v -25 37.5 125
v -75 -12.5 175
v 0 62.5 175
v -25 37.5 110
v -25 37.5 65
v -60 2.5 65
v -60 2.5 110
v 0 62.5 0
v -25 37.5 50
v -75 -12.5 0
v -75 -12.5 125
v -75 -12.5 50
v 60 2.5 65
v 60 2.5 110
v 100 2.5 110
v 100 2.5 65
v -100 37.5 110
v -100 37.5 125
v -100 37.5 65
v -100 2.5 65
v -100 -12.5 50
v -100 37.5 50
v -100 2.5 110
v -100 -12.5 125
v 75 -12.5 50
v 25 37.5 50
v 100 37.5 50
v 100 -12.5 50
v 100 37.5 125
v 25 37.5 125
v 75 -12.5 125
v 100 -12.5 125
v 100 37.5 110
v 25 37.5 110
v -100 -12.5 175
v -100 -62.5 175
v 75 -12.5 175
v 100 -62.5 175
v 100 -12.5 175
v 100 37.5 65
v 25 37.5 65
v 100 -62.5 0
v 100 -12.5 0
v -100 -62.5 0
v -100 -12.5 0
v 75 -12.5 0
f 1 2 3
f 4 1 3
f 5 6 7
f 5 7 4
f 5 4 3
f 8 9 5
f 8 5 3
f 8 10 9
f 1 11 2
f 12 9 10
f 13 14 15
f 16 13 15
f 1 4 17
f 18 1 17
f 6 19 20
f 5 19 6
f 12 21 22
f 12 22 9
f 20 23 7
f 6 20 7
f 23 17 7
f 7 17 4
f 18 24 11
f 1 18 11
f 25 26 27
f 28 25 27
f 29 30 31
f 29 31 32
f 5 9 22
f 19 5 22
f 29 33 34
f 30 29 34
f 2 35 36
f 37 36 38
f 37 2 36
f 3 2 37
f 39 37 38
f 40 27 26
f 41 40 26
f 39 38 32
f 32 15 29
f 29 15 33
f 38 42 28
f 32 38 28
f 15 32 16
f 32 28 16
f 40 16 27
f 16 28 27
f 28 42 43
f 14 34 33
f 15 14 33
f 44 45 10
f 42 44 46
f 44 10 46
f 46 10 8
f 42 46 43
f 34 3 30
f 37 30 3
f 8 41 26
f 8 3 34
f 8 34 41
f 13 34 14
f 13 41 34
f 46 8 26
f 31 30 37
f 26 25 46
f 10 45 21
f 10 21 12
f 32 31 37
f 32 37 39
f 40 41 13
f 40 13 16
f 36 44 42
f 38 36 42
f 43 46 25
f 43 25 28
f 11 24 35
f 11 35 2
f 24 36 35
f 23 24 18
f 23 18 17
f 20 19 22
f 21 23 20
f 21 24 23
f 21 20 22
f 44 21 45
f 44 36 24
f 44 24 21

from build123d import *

# Parameters (mm, degrees)
SKETCH1_W           = 200
SKETCH1_H           = 125
BOSS_EXTRUDE1_DEPTH = 175
CUT_EXTRUDE1_DEPTH  = 212.024287702
CUT_EXTRUDE2_DEPTH  = 212.024287702
BOSS_EXTRUDE2_DEPTH = 125
CUT_EXTRUDE3_DEPTH  = 110
BOSS_EXTRUDE3_DEPTH = 65
CUT_EXTRUDE4_DEPTH  = 50
SKETCH3_W           = 200
SKETCH3_H           = 45
BOSS_EXTRUDE4_DEPTH = 15


with BuildPart() as part:
    # Sketch1 → Boss-Extrude1 (new body)
    with BuildSketch(Plane.XY):
        Rectangle(SKETCH1_W, SKETCH1_H)
    extrude(amount=BOSS_EXTRUDE1_DEPTH)

    # Sketch1<3> → Cut-Extrude1 (cut, through all)
    with BuildSketch(Plane.XY):
        Polygon((-100, 62.5), (-100, 37.5), (-25, 37.5), (0, 62.5), align=None)
        Polygon((0, 62.5), (25, 37.5), (100, 37.5), (100, 62.5), align=None)
    extrude(amount=CUT_EXTRUDE1_DEPTH, mode=Mode.SUBTRACT)

    # Sketch1<4> → Cut-Extrude2 (cut, through all)
    with BuildSketch(Plane.XY):
        Polygon((-100, 37.5), (-100, -12.5), (-75, -12.5), (-25, 37.5), align=None)
        Polygon((25, 37.5), (75, -12.5), (100, -12.5), (100, 37.5), align=None)
    extrude(amount=CUT_EXTRUDE2_DEPTH, mode=Mode.SUBTRACT)

    # Sketch1<5> → Boss-Extrude2 (add)
    with BuildSketch(Plane.XY):
        Polygon((-100, 37.5), (-100, -12.5), (-75, -12.5), (-25, 37.5), align=None)
        Polygon((25, 37.5), (75, -12.5), (100, -12.5), (100, 37.5), align=None)
    extrude(amount=BOSS_EXTRUDE2_DEPTH)

    # Sketch1<6> → Cut-Extrude3 (cut)
    with BuildSketch(Plane.XY):
        Polygon((-100, 37.5), (-100, -12.5), (-75, -12.5), (-25, 37.5), align=None)
        Polygon((25, 37.5), (75, -12.5), (100, -12.5), (100, 37.5), align=None)
    extrude(amount=CUT_EXTRUDE3_DEPTH, mode=Mode.SUBTRACT)

    # Sketch1<9> → Boss-Extrude3 (add)
    with BuildSketch(Plane.XY):
        Polygon((-100, 37.5), (-100, -12.5), (-75, -12.5), (-25, 37.5), align=None)
        Polygon((25, 37.5), (75, -12.5), (100, -12.5), (100, 37.5), align=None)
    extrude(amount=BOSS_EXTRUDE3_DEPTH)

    # Sketch1<10> → Cut-Extrude4 (cut)
    with BuildSketch(Plane.XY):
        Polygon((-100, 37.5), (-100, -12.5), (-75, -12.5), (-25, 37.5), align=None)
        Polygon((25, 37.5), (75, -12.5), (100, -12.5), (100, 37.5), align=None)
    extrude(amount=CUT_EXTRUDE4_DEPTH, mode=Mode.SUBTRACT)

    # Sketch3 → Boss-Extrude4 (add)
    with BuildSketch(Plane(origin=(0, -12.5, 0), x_dir=(1, 0, 0), z_dir=(0, 1, 0))):
        with Locations((0, -87.5)):
            Rectangle(SKETCH3_W, SKETCH3_H)
    extrude(amount=BOSS_EXTRUDE4_DEPTH)


solid = part.part
